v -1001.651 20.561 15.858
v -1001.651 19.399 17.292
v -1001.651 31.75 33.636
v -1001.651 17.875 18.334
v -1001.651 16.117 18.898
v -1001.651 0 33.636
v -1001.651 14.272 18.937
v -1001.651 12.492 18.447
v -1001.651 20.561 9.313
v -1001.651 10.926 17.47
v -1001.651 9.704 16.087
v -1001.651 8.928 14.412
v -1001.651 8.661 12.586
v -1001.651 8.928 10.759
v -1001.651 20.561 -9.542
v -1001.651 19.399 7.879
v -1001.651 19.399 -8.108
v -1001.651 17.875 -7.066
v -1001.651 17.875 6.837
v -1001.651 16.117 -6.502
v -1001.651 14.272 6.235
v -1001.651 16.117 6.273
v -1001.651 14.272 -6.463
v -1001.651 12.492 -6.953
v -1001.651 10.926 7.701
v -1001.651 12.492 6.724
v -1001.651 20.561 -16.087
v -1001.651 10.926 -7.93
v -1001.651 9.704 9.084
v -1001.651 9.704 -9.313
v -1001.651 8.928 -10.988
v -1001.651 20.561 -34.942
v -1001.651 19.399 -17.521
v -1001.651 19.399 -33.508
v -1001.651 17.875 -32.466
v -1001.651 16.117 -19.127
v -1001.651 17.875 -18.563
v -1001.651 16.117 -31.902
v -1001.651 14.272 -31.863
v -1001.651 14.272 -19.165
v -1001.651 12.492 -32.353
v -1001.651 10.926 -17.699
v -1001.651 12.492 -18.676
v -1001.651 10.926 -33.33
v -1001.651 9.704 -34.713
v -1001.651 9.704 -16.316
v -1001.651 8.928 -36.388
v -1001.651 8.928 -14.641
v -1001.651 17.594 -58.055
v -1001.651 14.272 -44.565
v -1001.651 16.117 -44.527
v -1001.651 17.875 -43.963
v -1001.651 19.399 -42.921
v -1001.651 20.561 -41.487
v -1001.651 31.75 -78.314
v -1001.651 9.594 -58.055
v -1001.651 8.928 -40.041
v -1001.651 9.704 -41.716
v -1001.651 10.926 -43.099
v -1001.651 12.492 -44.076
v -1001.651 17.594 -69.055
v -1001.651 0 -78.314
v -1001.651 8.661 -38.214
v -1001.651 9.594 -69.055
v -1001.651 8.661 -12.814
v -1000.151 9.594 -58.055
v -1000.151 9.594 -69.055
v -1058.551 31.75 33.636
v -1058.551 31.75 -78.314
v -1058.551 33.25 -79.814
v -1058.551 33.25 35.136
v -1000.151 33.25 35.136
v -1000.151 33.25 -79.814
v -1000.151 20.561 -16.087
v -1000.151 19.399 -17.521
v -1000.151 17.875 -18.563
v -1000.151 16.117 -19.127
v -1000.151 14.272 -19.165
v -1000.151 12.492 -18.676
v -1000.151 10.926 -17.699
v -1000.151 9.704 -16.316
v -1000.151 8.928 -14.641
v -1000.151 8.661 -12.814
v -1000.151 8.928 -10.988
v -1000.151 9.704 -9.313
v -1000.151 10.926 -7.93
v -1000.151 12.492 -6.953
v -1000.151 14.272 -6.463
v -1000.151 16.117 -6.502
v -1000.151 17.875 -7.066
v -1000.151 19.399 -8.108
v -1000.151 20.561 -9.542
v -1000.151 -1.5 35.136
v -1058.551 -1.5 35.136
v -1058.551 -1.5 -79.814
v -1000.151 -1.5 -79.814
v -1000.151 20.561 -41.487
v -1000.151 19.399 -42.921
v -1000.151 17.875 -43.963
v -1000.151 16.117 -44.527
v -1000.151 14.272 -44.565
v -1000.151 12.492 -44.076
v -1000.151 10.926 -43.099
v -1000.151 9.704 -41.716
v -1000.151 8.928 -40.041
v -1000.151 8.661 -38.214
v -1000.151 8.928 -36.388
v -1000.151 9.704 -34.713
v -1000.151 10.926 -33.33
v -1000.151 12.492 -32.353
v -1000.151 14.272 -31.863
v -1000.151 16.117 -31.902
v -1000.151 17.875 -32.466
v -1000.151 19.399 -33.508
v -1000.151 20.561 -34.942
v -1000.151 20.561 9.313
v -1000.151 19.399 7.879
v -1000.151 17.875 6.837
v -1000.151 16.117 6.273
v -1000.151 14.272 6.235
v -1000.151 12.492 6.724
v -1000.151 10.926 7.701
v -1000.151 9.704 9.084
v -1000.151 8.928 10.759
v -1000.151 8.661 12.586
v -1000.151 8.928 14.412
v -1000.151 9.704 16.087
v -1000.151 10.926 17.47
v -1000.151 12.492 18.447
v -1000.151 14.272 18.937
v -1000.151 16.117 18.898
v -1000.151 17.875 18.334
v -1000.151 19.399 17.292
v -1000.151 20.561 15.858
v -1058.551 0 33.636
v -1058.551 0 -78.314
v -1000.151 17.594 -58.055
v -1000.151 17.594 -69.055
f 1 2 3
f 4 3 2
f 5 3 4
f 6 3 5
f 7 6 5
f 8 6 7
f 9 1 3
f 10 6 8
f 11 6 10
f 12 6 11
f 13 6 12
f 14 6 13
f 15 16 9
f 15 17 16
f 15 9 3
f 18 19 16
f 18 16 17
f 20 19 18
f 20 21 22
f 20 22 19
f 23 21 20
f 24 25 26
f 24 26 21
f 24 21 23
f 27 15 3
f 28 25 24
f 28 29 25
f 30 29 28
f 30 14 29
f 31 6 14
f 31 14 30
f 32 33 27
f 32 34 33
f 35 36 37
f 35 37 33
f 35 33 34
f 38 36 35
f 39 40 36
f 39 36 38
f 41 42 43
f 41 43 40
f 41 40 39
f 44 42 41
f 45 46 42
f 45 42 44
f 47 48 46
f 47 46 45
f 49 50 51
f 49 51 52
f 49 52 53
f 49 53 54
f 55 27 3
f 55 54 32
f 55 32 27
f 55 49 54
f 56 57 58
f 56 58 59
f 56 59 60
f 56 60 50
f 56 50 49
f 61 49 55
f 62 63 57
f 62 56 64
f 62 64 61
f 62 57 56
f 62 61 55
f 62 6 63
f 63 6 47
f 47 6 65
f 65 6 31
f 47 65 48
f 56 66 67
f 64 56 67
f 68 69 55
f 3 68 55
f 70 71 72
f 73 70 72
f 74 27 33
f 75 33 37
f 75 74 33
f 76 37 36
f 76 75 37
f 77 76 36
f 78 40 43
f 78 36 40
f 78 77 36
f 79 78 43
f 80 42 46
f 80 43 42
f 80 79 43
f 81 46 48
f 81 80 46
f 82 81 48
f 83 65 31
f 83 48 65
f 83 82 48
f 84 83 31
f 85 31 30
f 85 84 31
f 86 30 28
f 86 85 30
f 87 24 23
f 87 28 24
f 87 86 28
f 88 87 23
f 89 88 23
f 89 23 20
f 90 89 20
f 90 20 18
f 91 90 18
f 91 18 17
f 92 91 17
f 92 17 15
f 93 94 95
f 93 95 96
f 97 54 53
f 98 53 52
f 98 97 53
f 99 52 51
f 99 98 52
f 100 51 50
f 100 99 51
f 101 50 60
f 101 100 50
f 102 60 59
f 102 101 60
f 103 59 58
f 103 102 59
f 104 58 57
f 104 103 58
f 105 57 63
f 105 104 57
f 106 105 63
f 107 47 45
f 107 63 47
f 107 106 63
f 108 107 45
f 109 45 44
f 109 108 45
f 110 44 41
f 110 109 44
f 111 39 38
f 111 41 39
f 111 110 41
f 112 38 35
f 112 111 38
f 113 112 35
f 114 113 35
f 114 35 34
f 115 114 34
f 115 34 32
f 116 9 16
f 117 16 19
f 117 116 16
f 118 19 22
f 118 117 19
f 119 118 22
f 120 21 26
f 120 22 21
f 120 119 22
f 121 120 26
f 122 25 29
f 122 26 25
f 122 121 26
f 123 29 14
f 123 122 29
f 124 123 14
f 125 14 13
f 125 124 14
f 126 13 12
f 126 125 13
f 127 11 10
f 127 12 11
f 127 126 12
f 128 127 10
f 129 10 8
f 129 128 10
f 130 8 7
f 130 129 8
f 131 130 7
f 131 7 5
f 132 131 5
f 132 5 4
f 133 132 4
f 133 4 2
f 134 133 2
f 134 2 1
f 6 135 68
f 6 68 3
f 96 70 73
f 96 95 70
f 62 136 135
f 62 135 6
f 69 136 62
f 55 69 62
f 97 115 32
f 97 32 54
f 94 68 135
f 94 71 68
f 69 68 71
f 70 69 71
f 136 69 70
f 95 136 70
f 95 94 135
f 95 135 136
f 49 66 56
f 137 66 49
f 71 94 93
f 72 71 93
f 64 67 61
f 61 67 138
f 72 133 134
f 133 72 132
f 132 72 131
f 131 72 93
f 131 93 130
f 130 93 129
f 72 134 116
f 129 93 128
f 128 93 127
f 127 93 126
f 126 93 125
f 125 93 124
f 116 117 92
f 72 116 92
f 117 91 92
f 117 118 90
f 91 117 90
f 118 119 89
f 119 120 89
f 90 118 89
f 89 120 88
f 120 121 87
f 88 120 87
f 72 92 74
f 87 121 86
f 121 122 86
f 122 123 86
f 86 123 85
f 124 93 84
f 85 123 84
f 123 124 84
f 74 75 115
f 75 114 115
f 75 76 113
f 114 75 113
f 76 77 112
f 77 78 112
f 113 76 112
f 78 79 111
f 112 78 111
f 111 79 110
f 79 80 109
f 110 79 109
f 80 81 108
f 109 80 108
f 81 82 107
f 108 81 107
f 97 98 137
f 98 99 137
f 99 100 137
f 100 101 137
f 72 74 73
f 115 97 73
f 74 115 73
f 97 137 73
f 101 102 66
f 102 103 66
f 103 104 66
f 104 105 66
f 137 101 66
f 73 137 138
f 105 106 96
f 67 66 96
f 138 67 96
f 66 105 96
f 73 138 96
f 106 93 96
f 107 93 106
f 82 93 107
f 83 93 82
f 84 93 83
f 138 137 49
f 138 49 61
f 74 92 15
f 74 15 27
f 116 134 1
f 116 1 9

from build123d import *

# Parameters (mm, degrees)
SKETCH1_W       = 56.9
SKETCH1_H       = 111.95
MAINBODY_DEPTH  = 31.75
SHELL1_T        = 1.5
USBCUTOUT_REACH = 106.338
SKETCH4_W       = 11
SKETCH4_H       = 8
BNCCUTOUT_REACH = 106.338


with BuildPart() as part:
    # Sketch1 → MainBody (new body)
    with BuildSketch(Plane(origin=(0, 0, 0), x_dir=(1, 0, 0), z_dir=(0, 1, 0))):
        with Locations((-1030.101436168, 22.339371288)):
            Rectangle(SKETCH1_W, SKETCH1_H)
    extrude(amount=MAINBODY_DEPTH)

    # Shell1
    shell1_openings = [part.faces().sort_by_distance(p)[0] for p in [
        (-1058.551436168, 15.875, -22.339371288),
    ]]
    offset(amount=SHELL1_T, openings=shell1_openings, kind=Kind.INTERSECTION)

    # Sketch4 → USBCutout (cut, up to next)
    with BuildSketch(Plane(origin=(-1000.151436168, 0, 0), x_dir=(0, 0, -1), z_dir=(1, 0, 0)), mode=Mode.PRIVATE) as usbcutout_sk1:
        with Locations((63.554743949, 13.594071179)):
            Rectangle(SKETCH4_W, SKETCH4_H)
    usbcutout_tool1 = extrude(usbcutout_sk1.sketch, amount=-USBCUTOUT_REACH, mode=Mode.PRIVATE) & part.part
    add(usbcutout_tool1.solids().sort_by_distance((-1000.151436, 13.594071, -63.554744))[0], mode=Mode.SUBTRACT)

    # Sketch3 → BNCCutout (cut, up to next)
    with BuildSketch(Plane(origin=(-1000.151436168, 0, 0), x_dir=(0, 0, -1), z_dir=(1, 0, 0)), mode=Mode.PRIVATE) as bnccutout_sk1:
        with BuildLine():
            Line((-15.858242347, 20.56132), (-9.313015078, 20.56132))
            ThreePointArc((-9.313015078, 20.56132), (-12.585628712, 8.66132), (-15.858242347, 20.56132))
        make_face()
    bnccutout_tool1 = extrude(bnccutout_sk1.sketch, amount=-BNCCUTOUT_REACH, mode=Mode.PRIVATE) & part.part
    # Sketch3 → BNCCutout (cut, up to next)
    with BuildSketch(Plane(origin=(-1000.151436168, 0, 0), x_dir=(0, 0, -1), z_dir=(1, 0, 0)), mode=Mode.PRIVATE) as bnccutout_sk2:
        with BuildLine():
            Line((9.541757653, 20.56132), (16.086984922, 20.56132))
            ThreePointArc((16.086984922, 20.56132), (12.814371288, 8.66132), (9.541757653, 20.56132))
        make_face()
    bnccutout_tool2 = extrude(bnccutout_sk2.sketch, amount=-BNCCUTOUT_REACH, mode=Mode.PRIVATE) & part.part
    # Sketch3 → BNCCutout (cut, up to next)
    with BuildSketch(Plane(origin=(-1000.151436168, 0, 0), x_dir=(0, 0, -1), z_dir=(1, 0, 0)), mode=Mode.PRIVATE) as bnccutout_sk3:
        with BuildLine():
            Line((34.941757653, 20.56132), (41.486984922, 20.56132))
            ThreePointArc((41.486984922, 20.56132), (38.214371288, 8.66132), (34.941757653, 20.56132))
        make_face()
    bnccutout_tool3 = extrude(bnccutout_sk3.sketch, amount=-BNCCUTOUT_REACH, mode=Mode.PRIVATE) & part.part
    add(bnccutout_tool1.solids().sort_by_distance((-1000.151436, 14.873929, 12.585629))[0], mode=Mode.SUBTRACT)
    add(bnccutout_tool2.solids().sort_by_distance((-1000.151436, 14.873929, -12.814371))[0], mode=Mode.SUBTRACT)
    add(bnccutout_tool3.solids().sort_by_distance((-1000.151436, 14.873929, -38.214371))[0], mode=Mode.SUBTRACT)


solid = part.part
